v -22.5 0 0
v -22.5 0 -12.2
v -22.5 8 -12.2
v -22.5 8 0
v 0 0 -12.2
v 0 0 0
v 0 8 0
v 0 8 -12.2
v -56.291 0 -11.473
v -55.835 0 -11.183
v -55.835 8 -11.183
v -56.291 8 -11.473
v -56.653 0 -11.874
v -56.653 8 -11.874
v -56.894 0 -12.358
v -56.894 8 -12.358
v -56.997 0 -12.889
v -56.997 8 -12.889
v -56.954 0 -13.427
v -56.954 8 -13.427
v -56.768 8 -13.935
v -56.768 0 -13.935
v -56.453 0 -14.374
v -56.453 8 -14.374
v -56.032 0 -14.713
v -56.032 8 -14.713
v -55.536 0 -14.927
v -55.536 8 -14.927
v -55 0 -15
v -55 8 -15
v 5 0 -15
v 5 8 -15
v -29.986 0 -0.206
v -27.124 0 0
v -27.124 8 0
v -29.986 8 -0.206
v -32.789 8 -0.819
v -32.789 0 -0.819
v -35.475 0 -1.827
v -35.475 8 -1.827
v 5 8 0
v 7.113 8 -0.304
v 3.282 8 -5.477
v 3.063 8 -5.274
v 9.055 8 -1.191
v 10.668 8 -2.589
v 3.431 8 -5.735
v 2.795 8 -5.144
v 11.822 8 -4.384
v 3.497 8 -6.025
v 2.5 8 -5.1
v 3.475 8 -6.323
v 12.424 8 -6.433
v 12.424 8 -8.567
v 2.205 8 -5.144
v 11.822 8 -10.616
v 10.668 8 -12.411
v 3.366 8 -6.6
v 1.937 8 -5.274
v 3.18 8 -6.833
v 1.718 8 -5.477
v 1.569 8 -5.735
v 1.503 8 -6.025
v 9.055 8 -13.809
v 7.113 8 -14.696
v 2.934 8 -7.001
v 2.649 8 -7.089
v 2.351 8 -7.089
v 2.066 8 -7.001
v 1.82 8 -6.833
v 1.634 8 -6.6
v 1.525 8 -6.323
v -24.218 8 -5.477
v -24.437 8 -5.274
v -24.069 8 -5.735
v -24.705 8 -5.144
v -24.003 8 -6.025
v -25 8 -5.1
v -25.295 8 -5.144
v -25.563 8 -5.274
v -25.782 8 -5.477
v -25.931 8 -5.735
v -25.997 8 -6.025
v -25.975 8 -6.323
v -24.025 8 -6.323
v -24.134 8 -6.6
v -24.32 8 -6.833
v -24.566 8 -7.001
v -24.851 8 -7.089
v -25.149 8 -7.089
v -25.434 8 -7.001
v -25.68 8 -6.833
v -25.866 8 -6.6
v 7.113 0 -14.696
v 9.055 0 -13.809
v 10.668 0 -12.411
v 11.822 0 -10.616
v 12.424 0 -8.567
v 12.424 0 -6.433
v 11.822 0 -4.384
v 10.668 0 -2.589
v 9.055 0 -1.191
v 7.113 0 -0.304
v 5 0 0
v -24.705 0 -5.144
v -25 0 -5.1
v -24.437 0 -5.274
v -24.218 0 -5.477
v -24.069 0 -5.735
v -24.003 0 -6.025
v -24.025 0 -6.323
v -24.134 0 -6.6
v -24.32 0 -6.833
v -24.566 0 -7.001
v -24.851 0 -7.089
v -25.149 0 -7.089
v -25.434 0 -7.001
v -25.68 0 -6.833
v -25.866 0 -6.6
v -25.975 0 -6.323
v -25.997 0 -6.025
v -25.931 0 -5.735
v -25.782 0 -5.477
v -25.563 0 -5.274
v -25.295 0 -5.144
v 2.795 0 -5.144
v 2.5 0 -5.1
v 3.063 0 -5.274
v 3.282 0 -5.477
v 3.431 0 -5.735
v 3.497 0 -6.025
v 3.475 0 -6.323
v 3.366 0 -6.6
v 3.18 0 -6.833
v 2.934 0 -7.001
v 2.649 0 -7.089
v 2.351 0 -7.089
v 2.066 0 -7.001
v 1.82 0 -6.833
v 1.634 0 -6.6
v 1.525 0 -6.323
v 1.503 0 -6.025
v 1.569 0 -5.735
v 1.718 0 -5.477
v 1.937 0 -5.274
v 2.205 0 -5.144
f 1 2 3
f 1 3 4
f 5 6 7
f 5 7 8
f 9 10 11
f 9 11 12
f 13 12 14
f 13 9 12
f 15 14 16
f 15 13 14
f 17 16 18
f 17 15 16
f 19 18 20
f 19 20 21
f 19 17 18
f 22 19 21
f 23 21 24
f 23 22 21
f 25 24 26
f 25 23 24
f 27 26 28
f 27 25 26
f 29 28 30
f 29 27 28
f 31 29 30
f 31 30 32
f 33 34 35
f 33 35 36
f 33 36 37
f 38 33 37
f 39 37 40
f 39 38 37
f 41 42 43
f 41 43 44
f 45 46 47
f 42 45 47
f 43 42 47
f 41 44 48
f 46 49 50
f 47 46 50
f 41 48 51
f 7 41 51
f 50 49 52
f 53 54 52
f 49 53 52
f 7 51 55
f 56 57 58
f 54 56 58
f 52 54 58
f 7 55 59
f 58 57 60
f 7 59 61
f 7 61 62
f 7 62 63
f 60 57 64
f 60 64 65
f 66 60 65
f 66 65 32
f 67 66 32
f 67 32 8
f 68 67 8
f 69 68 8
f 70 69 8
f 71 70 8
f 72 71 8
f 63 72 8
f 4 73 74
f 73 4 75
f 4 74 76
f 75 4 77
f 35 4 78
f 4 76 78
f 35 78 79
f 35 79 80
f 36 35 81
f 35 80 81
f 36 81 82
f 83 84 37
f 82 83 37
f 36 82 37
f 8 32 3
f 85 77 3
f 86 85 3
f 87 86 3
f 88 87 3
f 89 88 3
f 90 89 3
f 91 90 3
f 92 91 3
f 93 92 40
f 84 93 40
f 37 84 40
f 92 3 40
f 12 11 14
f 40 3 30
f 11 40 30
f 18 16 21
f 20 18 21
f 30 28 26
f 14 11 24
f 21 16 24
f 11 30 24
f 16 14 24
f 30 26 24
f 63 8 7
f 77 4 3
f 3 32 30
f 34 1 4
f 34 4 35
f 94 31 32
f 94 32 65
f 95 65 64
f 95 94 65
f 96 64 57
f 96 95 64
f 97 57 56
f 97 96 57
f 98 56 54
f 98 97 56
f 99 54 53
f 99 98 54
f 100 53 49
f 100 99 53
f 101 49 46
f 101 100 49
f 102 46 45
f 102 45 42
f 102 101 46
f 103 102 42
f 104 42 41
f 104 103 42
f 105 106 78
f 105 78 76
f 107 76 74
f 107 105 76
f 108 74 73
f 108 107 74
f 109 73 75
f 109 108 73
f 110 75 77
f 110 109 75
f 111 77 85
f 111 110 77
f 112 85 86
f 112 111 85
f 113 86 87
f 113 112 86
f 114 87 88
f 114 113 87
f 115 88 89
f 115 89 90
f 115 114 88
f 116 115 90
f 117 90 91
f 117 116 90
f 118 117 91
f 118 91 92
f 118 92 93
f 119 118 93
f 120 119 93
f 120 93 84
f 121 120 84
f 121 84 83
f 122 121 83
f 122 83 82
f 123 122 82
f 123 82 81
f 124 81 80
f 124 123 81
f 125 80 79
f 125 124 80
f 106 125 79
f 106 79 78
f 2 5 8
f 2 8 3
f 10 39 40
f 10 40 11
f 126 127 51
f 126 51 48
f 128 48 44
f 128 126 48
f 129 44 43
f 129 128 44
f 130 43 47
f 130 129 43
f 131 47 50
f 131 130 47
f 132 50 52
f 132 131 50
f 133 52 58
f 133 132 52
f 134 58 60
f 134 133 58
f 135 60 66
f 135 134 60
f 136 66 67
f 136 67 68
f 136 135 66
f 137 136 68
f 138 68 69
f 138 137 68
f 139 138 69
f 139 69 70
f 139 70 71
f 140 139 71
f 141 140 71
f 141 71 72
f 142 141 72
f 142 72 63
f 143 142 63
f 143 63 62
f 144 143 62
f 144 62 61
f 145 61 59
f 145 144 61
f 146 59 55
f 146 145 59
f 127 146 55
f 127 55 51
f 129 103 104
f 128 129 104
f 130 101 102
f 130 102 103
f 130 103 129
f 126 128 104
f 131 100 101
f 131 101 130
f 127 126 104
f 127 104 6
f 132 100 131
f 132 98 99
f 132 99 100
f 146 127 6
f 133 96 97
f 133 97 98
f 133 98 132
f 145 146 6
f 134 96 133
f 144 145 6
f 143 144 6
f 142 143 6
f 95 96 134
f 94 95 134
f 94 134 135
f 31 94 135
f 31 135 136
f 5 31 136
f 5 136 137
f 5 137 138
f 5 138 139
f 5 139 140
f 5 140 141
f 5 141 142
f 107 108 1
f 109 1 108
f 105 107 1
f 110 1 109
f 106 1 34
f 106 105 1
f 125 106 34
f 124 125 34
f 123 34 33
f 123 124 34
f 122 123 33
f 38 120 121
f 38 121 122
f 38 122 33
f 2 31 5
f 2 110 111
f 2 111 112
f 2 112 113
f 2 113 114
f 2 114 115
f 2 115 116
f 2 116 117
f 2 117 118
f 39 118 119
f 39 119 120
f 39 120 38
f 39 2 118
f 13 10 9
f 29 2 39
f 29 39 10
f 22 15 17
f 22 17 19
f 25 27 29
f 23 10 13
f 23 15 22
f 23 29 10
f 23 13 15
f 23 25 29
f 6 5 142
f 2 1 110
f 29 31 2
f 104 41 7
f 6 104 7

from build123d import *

# Parameters (mm, degrees)
SKETCH_1_R      = 1
EXTRUDE_1_DEPTH = 8


with BuildPart() as part:
    # 草圖1 → 填料-伸長1 (new body)
    with BuildSketch(Plane(origin=(0, 0, 0), x_dir=(1, 0, 0), z_dir=(0, 1, 0))):
        with BuildLine():
            Line((0, 0), (0, 12.2))
            Line((0, 12.2), (-22.5, 12.2))
            Line((-22.5, 12.2), (-22.5, 0))
            Line((-22.5, 0), (-27.124303732, 0))
            ThreePointArc((-27.124303732, 0), (-31.398520886, 0.462060812), (-35.475243216, 1.826893228))
            Line((-35.475243216, 1.826893228), (-55.835093948, 11.182689323))
            ThreePointArc((-55.835093948, 11.182689323), (-56.953793919, 13.427421715), (-55, 15))
            Line((-55, 15), (5, 15))
            ThreePointArc((5, 15), (12.5, 7.5), (5, 0))
            Line((5, 0), (0, 0))
        make_face()
        with Locations(Location((-25, 6.1, 0), (0, 0, 270))):
            Circle(SKETCH_1_R, mode=Mode.SUBTRACT)
        with Locations(Location((2.5, 6.1, 0), (0, 0, 270))):
            Circle(SKETCH_1_R, mode=Mode.SUBTRACT)
    extrude(amount=EXTRUDE_1_DEPTH)


solid = part.part
